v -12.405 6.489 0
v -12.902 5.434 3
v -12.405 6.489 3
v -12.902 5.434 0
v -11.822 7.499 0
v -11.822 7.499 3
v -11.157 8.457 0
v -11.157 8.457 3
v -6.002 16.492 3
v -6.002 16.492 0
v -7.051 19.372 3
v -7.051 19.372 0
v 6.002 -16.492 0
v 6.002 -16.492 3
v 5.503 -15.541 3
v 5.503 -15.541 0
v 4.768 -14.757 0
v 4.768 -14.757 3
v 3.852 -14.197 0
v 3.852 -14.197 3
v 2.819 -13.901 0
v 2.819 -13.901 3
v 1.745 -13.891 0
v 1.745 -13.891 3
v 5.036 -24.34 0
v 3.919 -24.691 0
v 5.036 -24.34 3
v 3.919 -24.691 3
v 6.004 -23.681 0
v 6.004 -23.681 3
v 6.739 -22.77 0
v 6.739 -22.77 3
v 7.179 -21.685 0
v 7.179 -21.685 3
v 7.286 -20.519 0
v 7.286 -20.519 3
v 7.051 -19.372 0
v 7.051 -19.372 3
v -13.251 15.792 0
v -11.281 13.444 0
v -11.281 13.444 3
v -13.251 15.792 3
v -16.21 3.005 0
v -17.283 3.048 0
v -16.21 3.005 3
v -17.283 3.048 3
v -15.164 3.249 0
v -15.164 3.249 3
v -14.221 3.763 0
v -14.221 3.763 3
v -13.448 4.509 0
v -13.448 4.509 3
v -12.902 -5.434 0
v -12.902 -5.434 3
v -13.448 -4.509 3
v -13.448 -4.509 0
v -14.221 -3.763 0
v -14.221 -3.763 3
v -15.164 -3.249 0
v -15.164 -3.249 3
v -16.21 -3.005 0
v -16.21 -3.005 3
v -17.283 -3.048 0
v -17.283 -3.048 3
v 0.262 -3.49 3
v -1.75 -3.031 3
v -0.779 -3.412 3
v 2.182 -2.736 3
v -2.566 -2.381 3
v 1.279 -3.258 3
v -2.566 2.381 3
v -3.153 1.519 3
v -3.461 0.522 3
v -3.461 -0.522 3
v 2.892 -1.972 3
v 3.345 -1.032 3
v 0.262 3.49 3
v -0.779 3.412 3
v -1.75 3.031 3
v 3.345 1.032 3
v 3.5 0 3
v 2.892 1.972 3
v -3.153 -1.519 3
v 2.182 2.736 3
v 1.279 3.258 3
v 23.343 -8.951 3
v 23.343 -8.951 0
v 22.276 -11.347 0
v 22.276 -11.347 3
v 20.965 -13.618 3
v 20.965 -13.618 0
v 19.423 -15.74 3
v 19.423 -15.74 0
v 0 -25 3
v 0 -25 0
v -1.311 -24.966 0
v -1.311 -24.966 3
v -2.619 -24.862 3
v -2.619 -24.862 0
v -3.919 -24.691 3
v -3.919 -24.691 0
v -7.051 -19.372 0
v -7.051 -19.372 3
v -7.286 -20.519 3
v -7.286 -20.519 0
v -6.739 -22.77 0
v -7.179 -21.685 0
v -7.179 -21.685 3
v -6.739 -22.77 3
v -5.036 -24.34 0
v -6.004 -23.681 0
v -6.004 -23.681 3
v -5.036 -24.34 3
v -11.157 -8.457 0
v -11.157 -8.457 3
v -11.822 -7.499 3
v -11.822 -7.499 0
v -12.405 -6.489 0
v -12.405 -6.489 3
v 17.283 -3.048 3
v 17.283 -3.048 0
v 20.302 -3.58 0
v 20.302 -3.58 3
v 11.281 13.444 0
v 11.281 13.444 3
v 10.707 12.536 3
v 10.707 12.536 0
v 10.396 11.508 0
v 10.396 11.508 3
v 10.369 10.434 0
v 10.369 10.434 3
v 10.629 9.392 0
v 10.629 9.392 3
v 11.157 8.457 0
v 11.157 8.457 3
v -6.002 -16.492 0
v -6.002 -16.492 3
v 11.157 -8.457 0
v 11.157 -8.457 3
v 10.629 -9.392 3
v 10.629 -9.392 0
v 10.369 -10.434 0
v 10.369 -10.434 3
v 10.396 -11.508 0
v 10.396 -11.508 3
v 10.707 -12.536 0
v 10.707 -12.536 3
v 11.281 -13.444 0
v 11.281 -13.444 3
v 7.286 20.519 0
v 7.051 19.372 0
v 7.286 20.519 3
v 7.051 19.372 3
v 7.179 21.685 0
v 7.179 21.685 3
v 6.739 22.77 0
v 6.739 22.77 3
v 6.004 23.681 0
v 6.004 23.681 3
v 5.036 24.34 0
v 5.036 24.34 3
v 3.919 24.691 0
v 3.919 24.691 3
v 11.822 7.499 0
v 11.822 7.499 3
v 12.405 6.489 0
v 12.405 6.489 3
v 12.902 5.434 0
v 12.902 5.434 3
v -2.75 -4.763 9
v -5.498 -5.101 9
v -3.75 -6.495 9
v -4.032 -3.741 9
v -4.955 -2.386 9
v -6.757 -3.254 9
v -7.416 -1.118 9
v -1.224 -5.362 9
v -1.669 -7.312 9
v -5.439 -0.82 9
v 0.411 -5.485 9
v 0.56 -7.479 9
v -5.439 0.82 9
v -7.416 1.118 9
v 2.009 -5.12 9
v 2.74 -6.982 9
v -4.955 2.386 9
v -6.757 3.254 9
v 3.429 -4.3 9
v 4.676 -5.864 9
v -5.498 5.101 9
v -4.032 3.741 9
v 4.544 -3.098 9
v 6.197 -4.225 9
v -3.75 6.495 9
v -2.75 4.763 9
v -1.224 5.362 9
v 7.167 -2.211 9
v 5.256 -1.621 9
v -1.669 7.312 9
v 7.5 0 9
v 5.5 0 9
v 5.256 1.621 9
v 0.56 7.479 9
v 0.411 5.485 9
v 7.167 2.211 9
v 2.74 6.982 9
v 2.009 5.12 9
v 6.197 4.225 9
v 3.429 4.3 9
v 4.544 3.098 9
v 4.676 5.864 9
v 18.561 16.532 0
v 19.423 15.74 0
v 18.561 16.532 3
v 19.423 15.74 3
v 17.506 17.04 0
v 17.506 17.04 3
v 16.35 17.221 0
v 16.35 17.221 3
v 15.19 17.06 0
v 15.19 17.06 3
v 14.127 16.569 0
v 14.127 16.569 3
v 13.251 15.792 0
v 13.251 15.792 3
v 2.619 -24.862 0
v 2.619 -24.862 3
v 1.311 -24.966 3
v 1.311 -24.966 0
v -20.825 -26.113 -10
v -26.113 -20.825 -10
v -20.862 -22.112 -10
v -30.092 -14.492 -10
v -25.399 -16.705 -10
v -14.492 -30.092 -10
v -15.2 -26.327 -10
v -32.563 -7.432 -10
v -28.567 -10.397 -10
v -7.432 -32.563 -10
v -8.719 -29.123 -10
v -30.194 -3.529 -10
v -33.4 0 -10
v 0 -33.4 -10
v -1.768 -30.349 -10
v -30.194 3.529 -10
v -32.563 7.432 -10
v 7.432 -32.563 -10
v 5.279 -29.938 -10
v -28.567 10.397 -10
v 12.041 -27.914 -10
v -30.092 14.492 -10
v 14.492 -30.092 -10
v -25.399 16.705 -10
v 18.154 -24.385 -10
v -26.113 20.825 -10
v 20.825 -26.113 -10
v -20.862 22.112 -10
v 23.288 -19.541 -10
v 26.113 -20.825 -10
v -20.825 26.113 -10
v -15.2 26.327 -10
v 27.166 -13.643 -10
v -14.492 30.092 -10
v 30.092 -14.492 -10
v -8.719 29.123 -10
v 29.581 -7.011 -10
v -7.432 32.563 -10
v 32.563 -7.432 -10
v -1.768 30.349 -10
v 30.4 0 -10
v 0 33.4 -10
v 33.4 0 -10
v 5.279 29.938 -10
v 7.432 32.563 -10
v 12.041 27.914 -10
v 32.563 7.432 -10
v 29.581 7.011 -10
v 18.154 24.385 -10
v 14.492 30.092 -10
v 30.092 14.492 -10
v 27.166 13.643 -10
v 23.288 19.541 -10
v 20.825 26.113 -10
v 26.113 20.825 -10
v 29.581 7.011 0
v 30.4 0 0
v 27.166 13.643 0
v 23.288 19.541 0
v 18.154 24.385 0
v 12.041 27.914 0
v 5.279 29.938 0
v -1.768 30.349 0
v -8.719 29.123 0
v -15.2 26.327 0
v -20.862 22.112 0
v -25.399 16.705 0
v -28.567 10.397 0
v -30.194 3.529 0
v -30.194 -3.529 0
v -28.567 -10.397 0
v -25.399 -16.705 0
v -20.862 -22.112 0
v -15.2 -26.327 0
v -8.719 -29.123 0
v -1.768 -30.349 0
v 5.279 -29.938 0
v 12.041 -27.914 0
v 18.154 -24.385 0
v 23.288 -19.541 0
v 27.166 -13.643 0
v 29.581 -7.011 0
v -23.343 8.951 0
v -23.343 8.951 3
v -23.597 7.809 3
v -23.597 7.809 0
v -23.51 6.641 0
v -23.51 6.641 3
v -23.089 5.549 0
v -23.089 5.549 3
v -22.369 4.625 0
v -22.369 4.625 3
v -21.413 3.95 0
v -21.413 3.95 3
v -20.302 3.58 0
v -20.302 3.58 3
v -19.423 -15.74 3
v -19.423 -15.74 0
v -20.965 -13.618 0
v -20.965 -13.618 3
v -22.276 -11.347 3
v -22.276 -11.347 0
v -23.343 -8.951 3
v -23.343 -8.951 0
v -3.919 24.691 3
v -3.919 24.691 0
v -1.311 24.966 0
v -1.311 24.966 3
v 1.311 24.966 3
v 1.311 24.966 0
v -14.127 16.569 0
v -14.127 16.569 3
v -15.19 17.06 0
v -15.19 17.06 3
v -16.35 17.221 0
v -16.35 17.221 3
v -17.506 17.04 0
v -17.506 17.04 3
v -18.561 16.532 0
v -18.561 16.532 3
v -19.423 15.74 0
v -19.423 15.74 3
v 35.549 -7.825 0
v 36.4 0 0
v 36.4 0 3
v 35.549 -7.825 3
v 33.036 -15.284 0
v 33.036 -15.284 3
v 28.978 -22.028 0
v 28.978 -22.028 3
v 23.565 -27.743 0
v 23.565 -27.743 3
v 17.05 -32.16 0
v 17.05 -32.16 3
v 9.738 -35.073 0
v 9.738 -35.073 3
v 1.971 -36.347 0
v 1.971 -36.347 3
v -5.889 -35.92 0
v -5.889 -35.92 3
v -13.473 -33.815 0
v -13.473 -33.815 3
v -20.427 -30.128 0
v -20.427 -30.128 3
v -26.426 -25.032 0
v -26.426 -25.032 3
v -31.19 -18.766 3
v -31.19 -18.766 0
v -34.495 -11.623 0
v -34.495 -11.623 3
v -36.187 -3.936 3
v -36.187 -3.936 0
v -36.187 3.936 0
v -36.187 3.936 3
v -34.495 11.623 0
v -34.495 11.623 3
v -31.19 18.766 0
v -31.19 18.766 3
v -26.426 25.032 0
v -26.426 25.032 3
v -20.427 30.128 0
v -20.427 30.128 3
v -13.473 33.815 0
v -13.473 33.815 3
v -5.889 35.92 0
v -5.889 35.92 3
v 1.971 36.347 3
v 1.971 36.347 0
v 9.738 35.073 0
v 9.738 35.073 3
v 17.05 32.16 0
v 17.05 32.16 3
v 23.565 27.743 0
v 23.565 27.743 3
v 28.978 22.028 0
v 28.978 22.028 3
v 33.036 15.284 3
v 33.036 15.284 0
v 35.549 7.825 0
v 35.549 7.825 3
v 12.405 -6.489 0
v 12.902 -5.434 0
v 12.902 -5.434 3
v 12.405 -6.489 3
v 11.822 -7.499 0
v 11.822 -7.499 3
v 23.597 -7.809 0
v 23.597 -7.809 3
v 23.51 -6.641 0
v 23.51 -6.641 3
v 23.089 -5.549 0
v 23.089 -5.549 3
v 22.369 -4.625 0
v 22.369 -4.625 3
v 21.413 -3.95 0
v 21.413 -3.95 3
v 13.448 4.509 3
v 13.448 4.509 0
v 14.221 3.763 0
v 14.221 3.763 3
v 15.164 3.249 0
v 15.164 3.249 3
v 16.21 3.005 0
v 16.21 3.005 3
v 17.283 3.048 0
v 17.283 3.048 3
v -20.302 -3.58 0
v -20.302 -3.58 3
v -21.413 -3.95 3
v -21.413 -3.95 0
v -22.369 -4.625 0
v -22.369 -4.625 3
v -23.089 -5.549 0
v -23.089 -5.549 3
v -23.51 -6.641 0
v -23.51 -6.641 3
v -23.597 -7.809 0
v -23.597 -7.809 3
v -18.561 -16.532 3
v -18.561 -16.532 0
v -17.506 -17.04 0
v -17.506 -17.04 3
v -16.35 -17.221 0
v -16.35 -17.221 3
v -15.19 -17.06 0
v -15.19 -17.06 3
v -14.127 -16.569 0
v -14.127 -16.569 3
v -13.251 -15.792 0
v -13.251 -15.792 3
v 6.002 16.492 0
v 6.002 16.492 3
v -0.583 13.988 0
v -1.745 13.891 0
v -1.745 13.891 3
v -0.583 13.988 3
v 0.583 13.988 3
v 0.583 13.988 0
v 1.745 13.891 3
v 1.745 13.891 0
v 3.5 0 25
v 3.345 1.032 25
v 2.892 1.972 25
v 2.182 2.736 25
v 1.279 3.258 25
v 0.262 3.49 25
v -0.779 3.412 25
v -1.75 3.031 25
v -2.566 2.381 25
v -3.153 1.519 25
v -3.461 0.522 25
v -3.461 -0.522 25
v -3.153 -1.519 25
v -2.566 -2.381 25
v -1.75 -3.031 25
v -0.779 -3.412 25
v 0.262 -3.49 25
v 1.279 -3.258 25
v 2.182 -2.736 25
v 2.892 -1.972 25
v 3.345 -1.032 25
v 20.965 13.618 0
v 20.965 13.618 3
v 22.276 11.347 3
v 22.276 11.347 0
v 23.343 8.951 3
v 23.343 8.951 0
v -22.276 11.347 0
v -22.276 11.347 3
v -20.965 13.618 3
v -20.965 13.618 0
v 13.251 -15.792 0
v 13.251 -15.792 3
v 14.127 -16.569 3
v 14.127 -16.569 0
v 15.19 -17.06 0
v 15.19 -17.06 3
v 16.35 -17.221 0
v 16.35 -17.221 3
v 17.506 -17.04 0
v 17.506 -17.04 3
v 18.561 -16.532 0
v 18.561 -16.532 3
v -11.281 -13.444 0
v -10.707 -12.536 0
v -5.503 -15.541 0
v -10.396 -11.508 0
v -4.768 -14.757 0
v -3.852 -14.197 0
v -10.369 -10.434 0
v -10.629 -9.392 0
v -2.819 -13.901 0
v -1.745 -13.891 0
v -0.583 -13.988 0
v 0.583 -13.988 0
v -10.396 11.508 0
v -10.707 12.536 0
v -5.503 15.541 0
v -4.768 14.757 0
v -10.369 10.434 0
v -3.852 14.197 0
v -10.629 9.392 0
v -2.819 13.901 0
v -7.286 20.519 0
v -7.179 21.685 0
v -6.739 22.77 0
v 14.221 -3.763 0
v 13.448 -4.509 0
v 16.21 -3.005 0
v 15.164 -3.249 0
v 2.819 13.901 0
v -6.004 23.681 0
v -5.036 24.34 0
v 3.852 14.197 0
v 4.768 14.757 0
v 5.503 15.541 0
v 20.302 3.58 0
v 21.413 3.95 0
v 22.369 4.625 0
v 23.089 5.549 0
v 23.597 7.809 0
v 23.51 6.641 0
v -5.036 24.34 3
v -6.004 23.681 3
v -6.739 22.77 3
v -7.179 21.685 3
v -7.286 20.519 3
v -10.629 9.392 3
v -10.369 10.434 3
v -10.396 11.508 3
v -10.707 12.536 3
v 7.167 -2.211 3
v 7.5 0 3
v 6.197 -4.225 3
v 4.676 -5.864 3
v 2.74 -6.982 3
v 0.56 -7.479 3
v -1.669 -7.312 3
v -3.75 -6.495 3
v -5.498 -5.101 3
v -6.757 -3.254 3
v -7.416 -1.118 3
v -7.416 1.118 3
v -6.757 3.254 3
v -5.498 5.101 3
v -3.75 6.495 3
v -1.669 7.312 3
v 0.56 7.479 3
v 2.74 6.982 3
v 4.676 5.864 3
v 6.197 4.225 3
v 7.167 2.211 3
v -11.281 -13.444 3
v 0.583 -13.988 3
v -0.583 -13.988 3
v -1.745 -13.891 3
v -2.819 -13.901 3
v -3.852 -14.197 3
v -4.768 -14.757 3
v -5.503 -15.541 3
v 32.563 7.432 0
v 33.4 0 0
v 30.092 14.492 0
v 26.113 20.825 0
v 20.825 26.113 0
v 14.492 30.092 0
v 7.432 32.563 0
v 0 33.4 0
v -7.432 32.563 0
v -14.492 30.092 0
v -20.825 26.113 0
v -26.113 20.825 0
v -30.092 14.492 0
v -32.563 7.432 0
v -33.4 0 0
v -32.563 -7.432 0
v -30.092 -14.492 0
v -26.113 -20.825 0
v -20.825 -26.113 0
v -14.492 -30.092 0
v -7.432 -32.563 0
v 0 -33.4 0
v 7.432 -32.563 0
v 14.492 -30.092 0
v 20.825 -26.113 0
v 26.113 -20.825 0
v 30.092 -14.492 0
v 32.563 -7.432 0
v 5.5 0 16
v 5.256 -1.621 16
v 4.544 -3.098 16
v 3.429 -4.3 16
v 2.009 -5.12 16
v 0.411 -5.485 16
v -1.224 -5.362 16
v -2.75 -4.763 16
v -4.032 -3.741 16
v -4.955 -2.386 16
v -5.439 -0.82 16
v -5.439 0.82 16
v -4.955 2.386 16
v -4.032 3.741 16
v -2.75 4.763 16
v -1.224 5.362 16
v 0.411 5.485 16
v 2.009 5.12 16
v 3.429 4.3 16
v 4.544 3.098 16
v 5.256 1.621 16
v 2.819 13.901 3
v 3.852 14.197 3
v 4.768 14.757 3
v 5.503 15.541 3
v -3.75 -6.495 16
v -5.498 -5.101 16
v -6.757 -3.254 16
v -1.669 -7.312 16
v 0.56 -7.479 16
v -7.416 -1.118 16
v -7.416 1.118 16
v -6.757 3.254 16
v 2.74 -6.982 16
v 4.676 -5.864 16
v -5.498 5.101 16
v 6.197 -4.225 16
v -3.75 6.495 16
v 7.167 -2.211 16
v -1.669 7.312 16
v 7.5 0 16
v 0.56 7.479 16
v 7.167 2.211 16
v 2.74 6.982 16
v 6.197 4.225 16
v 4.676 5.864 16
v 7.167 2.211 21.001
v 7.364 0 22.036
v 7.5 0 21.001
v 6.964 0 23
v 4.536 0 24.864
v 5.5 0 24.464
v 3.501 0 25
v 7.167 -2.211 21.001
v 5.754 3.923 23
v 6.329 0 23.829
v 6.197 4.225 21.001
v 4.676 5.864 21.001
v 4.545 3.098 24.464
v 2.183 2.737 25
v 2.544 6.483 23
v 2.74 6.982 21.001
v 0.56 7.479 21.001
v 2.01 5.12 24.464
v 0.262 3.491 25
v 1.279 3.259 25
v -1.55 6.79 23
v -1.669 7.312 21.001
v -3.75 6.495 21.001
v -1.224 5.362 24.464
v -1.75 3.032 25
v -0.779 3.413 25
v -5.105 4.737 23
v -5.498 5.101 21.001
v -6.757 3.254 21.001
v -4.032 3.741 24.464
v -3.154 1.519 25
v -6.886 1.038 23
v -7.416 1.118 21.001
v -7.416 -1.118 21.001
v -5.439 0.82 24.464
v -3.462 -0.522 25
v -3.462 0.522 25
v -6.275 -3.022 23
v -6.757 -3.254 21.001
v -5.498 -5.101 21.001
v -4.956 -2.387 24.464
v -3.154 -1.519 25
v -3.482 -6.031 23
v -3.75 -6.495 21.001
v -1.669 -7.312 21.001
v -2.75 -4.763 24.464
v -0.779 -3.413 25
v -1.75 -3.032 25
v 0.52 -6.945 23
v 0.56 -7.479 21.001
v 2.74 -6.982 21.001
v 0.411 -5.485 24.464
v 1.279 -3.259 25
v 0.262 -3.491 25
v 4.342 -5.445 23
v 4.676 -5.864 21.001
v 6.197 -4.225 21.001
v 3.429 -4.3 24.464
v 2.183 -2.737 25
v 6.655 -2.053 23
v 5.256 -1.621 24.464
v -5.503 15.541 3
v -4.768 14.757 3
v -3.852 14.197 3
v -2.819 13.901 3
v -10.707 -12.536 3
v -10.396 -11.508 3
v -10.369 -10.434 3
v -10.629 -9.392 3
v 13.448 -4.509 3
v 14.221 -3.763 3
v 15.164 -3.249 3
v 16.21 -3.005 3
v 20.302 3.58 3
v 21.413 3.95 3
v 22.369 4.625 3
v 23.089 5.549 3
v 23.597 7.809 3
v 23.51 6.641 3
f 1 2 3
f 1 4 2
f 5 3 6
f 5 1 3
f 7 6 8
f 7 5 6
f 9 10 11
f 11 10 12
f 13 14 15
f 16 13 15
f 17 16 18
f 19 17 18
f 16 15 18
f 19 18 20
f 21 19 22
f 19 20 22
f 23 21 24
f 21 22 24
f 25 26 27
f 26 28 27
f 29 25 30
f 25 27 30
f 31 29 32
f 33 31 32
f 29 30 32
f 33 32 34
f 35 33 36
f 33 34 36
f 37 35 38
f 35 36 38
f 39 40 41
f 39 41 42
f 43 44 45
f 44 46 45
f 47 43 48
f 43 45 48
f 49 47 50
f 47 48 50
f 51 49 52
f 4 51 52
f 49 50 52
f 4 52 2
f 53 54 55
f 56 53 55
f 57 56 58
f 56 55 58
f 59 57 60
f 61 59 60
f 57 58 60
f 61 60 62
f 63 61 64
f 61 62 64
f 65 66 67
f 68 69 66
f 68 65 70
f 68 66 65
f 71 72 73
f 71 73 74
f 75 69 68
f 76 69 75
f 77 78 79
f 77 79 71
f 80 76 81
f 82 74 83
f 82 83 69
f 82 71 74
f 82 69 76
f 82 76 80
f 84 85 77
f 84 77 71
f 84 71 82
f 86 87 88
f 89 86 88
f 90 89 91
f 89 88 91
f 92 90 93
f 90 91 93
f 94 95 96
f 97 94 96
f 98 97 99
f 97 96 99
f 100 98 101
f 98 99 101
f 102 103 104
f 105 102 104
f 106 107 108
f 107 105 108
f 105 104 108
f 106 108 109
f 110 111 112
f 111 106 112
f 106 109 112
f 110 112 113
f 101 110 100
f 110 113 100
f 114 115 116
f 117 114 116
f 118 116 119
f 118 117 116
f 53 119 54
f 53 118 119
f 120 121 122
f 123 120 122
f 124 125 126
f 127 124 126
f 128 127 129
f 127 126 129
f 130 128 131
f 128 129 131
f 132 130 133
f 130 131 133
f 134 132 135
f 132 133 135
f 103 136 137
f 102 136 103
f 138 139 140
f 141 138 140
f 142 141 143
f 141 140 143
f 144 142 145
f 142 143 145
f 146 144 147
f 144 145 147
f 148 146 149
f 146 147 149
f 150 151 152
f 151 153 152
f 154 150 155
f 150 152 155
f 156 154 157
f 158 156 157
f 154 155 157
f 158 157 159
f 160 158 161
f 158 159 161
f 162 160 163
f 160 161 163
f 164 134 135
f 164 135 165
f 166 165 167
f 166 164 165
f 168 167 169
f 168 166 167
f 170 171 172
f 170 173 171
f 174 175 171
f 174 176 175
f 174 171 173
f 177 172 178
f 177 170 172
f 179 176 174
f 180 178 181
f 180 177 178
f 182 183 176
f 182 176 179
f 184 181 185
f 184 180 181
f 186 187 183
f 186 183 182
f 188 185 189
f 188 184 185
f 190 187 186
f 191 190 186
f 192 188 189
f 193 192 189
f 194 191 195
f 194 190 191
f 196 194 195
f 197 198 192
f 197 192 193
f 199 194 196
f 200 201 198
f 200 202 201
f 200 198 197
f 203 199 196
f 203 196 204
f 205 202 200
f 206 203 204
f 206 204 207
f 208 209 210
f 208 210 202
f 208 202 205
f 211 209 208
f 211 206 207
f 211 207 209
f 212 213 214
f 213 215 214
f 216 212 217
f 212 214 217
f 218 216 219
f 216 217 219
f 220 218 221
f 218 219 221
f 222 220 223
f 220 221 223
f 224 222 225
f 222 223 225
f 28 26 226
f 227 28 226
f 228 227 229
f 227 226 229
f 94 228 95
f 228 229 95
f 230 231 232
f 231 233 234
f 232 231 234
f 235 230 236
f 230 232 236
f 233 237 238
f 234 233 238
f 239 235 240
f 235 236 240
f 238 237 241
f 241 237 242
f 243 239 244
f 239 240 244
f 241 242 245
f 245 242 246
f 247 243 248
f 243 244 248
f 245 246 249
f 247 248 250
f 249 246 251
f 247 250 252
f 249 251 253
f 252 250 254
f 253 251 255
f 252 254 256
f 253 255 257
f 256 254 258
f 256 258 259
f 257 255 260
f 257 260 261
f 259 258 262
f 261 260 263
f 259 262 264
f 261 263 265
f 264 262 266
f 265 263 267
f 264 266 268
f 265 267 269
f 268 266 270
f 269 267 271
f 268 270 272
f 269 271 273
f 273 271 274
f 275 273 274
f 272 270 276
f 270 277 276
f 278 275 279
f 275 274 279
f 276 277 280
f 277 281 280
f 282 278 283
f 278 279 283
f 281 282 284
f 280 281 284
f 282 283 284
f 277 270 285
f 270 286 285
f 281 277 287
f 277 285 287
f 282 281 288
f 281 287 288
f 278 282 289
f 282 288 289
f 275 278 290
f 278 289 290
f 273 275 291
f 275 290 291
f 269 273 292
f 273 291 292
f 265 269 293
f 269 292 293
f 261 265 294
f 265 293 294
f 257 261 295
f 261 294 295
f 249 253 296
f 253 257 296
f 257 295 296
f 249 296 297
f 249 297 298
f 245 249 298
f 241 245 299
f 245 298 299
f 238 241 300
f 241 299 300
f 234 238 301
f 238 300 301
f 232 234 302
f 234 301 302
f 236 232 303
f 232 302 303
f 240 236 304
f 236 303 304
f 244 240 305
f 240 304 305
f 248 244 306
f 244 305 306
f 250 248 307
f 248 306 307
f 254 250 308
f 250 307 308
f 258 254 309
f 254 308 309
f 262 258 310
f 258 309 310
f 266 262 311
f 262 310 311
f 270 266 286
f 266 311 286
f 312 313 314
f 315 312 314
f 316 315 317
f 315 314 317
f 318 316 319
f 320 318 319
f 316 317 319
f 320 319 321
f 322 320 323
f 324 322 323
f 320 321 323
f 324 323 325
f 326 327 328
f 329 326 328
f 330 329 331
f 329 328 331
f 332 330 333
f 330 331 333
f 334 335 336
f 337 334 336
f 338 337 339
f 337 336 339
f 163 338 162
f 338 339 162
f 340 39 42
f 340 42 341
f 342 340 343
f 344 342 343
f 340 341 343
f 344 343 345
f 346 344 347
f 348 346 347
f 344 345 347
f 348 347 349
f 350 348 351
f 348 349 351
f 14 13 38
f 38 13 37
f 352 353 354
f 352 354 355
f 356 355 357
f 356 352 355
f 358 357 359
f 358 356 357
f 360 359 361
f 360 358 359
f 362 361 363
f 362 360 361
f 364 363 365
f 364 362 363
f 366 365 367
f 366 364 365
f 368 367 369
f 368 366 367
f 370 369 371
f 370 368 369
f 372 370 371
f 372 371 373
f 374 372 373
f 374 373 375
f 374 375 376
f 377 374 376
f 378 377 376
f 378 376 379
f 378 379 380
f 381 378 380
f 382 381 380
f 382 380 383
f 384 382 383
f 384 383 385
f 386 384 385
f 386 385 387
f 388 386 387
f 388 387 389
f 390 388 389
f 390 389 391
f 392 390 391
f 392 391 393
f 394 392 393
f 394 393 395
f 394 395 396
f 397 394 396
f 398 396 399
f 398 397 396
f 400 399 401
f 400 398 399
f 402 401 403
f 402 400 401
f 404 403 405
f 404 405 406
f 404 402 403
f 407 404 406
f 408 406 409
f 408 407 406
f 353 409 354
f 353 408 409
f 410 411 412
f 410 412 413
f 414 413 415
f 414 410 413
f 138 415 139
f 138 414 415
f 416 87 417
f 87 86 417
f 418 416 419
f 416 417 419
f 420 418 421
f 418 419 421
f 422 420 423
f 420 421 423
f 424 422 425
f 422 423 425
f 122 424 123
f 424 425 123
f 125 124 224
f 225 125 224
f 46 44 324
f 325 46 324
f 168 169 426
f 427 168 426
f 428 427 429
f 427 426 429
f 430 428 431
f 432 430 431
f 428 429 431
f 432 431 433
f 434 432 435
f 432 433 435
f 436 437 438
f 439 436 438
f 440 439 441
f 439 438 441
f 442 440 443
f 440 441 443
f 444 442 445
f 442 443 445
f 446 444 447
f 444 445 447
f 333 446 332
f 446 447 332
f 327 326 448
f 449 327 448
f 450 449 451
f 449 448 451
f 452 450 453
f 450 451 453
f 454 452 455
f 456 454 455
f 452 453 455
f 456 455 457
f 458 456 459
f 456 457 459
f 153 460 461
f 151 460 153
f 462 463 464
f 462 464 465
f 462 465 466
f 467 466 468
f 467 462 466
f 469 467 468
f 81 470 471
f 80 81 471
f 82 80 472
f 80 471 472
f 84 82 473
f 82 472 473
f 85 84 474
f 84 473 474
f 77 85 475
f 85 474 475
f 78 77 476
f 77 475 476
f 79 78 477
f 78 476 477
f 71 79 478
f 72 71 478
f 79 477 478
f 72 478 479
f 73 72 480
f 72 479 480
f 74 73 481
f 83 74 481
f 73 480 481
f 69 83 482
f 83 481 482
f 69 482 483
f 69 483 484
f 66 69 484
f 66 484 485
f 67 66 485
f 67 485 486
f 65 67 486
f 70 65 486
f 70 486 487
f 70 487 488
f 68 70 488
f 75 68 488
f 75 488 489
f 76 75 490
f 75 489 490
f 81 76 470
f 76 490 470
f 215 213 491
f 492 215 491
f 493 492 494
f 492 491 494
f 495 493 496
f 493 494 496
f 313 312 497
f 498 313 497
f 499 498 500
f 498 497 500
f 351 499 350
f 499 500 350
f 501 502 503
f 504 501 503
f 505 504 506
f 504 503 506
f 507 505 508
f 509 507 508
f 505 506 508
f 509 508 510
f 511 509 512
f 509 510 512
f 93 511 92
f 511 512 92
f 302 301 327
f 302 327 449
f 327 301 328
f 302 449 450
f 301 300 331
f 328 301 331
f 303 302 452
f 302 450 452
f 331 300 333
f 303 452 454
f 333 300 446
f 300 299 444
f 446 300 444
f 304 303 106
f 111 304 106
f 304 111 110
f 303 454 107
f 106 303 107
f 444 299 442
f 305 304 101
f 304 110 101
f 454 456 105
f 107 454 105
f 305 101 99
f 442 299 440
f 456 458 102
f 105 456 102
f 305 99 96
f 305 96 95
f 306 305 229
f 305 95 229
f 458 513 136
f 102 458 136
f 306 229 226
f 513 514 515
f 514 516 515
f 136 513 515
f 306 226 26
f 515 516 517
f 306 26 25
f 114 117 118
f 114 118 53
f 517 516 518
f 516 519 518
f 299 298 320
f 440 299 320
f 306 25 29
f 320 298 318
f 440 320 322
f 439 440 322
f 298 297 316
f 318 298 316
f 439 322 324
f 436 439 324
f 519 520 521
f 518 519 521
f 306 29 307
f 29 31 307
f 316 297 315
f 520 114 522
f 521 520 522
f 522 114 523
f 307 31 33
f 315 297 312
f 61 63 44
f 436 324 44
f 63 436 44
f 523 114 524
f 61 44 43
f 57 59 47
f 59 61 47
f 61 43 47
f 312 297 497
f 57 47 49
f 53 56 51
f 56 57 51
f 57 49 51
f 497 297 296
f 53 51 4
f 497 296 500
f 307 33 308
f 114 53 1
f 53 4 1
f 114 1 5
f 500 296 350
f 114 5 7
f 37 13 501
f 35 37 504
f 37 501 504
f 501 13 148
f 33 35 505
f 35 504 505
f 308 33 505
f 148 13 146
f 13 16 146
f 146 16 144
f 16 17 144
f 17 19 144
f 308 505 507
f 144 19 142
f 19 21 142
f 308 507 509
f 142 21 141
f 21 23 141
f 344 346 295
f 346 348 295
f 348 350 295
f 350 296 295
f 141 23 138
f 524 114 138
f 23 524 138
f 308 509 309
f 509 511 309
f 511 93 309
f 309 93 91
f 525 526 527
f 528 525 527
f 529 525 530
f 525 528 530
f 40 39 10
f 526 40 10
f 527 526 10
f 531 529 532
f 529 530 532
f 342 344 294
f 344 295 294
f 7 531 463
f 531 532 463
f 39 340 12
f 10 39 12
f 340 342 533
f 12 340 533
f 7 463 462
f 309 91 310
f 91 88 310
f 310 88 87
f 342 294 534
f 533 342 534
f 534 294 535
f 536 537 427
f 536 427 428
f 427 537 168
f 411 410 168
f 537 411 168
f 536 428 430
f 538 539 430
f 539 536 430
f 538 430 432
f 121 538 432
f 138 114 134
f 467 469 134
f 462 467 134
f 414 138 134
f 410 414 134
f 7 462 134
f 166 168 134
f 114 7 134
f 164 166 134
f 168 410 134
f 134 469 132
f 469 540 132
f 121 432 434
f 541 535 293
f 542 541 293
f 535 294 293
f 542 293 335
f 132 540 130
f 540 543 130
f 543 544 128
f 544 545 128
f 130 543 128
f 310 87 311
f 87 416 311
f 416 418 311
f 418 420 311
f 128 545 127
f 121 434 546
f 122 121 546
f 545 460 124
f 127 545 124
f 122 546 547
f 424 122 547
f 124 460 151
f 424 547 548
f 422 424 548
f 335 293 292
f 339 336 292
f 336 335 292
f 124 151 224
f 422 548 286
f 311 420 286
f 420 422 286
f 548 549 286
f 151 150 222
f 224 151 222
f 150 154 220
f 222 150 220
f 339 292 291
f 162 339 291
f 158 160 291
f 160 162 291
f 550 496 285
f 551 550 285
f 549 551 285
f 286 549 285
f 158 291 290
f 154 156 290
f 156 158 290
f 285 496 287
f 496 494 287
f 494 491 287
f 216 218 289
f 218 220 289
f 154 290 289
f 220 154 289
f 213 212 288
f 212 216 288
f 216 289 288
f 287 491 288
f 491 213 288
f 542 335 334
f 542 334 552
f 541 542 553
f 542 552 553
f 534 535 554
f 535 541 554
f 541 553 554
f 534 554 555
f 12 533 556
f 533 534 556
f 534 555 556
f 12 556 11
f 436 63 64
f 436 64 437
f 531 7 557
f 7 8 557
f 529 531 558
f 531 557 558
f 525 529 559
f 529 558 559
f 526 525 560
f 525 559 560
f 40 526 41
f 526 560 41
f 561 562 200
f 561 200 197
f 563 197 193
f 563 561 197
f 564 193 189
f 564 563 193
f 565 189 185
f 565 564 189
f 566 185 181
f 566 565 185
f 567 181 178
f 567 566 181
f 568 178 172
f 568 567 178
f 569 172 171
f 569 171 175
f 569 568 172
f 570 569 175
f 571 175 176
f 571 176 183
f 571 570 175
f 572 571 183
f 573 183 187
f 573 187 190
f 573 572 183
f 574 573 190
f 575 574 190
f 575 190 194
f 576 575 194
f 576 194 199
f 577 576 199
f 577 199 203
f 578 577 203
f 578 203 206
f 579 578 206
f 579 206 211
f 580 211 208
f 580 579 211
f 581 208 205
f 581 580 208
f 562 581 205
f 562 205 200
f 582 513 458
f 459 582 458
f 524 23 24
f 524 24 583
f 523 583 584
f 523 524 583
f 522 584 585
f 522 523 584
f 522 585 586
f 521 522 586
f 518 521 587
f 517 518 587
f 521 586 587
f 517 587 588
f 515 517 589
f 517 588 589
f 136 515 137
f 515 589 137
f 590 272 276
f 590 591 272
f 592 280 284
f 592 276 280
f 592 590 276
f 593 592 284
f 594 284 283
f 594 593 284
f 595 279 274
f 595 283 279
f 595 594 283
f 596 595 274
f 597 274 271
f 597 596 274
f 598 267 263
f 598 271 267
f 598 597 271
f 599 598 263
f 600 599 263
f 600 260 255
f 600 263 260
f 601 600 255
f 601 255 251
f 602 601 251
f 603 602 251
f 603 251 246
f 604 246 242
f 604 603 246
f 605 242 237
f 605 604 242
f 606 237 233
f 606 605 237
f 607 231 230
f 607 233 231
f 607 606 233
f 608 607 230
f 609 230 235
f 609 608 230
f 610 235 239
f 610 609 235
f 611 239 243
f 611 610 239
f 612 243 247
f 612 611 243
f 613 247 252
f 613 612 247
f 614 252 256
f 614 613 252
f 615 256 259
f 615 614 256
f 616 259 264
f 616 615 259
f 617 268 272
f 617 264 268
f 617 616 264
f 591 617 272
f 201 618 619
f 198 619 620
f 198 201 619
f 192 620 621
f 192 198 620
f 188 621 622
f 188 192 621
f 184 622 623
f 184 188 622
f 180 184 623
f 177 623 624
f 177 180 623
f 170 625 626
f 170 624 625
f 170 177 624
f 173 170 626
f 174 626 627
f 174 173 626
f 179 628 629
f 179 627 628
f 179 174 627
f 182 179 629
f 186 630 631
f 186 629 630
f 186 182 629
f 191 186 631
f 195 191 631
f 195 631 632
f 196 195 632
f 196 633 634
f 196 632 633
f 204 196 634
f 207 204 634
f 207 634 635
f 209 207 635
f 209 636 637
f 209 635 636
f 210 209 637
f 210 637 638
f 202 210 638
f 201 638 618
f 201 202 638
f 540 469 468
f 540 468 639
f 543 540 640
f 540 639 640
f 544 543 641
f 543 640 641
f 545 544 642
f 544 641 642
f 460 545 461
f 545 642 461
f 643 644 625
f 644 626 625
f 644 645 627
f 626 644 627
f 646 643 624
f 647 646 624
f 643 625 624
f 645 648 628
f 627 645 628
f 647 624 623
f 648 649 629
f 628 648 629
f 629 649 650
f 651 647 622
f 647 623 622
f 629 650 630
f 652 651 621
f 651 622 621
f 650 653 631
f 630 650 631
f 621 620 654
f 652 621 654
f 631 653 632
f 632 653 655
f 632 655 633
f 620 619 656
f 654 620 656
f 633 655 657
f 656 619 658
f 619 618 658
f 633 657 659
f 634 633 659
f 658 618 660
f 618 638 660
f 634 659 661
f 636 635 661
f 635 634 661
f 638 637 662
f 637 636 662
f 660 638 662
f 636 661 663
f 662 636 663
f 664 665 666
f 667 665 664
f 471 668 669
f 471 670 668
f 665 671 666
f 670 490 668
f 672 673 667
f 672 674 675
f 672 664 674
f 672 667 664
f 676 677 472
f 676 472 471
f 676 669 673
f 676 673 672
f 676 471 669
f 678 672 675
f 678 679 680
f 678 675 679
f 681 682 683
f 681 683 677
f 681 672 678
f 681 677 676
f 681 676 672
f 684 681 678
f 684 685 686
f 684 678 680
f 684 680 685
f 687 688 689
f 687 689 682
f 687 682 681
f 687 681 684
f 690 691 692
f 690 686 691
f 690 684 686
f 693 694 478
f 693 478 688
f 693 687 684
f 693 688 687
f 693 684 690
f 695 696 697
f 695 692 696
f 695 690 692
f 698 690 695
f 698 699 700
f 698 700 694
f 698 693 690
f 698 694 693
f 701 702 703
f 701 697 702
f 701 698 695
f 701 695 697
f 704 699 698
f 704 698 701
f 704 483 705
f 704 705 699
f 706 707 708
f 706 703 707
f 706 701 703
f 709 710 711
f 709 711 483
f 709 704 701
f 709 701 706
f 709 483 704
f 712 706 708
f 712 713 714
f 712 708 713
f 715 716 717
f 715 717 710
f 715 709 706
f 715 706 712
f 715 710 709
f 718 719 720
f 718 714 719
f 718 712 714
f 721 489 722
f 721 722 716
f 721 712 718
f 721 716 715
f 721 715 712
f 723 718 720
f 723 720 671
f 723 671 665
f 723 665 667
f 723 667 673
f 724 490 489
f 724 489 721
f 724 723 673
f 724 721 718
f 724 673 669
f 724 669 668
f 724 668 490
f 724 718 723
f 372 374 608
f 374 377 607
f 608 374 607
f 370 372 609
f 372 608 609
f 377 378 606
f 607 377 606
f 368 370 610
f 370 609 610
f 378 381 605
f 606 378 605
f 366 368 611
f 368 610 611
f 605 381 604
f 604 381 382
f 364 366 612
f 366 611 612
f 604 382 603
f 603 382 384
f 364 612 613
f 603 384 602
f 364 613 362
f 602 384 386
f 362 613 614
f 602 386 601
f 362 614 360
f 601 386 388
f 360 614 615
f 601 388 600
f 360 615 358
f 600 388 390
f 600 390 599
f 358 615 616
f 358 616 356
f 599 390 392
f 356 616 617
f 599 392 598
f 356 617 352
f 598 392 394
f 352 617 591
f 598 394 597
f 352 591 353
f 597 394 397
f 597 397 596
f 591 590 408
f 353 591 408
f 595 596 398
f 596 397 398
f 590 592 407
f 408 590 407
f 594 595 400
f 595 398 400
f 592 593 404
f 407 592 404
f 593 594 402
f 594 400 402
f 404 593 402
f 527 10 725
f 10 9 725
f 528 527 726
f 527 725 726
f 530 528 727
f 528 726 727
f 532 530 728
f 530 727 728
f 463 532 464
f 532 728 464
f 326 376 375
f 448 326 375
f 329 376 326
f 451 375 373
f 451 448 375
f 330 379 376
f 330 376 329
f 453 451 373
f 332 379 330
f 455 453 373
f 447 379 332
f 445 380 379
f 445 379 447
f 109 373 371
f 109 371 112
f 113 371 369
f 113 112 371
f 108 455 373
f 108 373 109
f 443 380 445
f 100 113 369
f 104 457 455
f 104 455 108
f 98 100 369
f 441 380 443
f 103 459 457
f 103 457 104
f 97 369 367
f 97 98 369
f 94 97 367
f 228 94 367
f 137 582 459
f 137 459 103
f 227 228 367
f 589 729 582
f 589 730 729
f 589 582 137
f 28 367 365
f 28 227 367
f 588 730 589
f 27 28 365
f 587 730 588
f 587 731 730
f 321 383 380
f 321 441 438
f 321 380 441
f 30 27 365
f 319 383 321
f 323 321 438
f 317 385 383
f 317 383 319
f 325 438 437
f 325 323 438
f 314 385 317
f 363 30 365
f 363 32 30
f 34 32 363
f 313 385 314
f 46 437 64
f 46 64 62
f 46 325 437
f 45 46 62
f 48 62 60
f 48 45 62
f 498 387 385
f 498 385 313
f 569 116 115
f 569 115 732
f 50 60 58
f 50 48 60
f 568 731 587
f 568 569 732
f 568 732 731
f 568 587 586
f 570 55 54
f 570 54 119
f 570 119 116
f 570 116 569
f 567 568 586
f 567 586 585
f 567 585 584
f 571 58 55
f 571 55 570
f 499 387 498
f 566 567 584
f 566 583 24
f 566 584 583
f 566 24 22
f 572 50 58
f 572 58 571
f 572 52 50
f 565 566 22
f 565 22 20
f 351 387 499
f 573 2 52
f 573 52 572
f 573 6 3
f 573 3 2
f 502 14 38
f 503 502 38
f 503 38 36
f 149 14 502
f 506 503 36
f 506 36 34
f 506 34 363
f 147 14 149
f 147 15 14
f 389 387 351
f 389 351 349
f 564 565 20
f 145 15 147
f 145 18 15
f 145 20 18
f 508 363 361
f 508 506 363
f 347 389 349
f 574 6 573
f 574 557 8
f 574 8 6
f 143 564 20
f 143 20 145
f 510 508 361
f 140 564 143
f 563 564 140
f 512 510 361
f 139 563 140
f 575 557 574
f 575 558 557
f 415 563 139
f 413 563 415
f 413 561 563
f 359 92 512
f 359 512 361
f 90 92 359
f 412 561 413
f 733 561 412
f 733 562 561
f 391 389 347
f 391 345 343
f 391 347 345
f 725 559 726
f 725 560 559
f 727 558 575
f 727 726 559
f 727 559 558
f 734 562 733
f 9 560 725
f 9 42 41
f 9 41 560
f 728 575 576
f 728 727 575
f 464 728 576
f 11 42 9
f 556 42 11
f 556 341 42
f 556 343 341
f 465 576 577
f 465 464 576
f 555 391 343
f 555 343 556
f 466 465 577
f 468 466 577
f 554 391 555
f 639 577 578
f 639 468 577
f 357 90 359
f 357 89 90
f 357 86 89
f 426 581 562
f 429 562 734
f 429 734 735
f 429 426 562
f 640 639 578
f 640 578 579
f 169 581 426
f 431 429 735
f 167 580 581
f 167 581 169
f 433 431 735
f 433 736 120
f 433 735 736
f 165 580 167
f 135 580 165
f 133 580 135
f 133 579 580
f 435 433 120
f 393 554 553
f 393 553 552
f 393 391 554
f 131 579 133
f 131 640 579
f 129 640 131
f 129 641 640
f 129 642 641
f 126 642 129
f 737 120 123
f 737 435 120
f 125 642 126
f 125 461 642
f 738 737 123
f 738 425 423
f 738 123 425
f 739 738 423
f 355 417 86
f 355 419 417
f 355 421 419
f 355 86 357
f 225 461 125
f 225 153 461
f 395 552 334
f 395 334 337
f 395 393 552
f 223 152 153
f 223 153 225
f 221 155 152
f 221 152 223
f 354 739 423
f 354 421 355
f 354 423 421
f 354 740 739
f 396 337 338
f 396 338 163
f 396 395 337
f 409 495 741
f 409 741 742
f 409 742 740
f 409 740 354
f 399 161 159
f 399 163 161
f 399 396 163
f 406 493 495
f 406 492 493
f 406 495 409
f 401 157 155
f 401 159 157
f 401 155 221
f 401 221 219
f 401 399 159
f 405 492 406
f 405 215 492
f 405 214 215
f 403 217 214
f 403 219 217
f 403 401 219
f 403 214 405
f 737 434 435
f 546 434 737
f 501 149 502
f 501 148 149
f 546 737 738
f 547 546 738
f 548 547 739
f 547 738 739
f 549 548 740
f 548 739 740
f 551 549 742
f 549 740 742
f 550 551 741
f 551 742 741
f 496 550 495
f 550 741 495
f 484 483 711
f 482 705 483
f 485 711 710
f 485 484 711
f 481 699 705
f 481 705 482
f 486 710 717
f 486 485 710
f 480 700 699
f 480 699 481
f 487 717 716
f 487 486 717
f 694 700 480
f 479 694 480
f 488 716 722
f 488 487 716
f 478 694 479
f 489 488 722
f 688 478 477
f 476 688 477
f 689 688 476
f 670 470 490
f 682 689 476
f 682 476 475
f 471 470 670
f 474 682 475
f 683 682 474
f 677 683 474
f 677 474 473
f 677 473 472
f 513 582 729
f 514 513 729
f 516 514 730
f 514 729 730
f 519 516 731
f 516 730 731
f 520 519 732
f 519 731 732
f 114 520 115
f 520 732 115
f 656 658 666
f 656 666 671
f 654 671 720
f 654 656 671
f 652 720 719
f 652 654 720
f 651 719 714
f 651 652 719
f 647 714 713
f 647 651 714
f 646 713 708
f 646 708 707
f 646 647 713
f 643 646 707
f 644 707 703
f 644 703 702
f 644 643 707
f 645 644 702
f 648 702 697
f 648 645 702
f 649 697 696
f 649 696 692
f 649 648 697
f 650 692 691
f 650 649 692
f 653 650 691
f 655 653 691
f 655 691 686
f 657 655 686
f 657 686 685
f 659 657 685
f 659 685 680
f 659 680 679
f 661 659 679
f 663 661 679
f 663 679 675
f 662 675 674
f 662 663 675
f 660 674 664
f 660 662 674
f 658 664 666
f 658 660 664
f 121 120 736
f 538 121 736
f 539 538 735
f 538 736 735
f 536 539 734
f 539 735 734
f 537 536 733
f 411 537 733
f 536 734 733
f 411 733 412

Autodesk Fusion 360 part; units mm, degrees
sketch "Sketch1" plane through (0, 0, 0) normal (0, 0, 1) x (1, 0, 0)
  circle A0 centre (0, 0) radius 30.4
  circle A1 centre (0, 0) radius 33.4
  circle A2 centre (0, 0) radius 36.4
  circle A3 centre (0, 0) radius 7.5
  circle A4 centre (0, 0) radius 14
  line L0 (0, 0) -> (4.7883, -13.1557)
  line L1 (0, 0) -> (-4.7883, -13.1557)
  line L2 (0, -60) -> (0, 60)
  line L3 (4.7883, -13.1557) -> (8.5505, -23.4923)
  line L4 (-4.7883, -13.1557) -> (-8.5505, -23.4923)
  arc A5 (8.5505, -23.4923) -> (-8.5505, -23.4923) centre (0, 0) ccw
  arc A6 (-8.5505, -23.4923) -> (0, -25) centre (0, 0) ccw
  arc A7 (0, -25) -> (8.5505, -23.4923) centre (0, 0) ccw
  line L5 (13.7873, -2.4311) -> (24.6202, -4.3412)
  line L6 (8.999, -10.7246) -> (16.0697, -19.1511)
  line L7 (8.999, 10.7246) -> (16.0697, 19.1511)
  line L8 (13.7873, 2.4311) -> (24.6202, 4.3412)
  line L9 (-4.7883, 13.1557) -> (-8.5505, 23.4923)
  line L10 (4.7883, 13.1557) -> (8.5505, 23.4923)
  line L11 (-13.7873, 2.4311) -> (-24.6202, 4.3412)
  line L12 (-8.999, 10.7246) -> (-16.0697, 19.1511)
  line L13 (-8.999, -10.7246) -> (-16.0697, -19.1511)
  line L14 (-13.7873, -2.4311) -> (-24.6202, -4.3412)
  circle A8 centre (0, 0) radius 3.5
  circle A9 centre (0, 0) radius 5.5
  point P0 (0, 7.5)
  dimension "d1" = 60.8
  dimension "d2" = 3
  dimension "d3" = 3
  dimension "d4" = 15
  dimension "d11" = 28
  dimension "d12" = 50
  dimension "d13" = 40
  dimension "d15" = 20
  dimension "d17" = 360
  dimension "d22" = -4
  dimension "d34" = -2
extrude "Extrude1" add sketch "Sketch1" against normal blind 10 contours A0 A1 L2 | A0 A1 L2
extrude "Extrude2" add sketch "Sketch1" along normal blind 3
extrude "Extrude3" add sketch "Sketch1" along normal blind 25 contours A3 L1 L2 A9 | A3 L0 L2 A9 | A3 L0 L2 A9 | A3 L1 L2 A9 | L0 L2 A8 A9 | L1 L2 A8 A9 | L1 L2 A8 A9 | L0 L2 A8 A9 | L0 L2 A8 | L1 L2 A8 | L1 L2 A8 | L0 L2 A8
extrude "Extrude4" cut sketch "Sketch1" along normal blind 3 contours A4 L2 A5 L10 | A4 L2 A5 L9 | A4 L2 L4 A6 | A4 L2 L3 A7 | A4 A5 L7 L8 | A4 A5 L11 L12 | A4 A5 L13 L14 | A4 A5 L5 L6
fillet "Fillet1" radius 4 24 edges at (-16.0697, 19.1511, 1.5) (-24.6202, 4.3412, 1.5) (-13.7873, 2.4311, 1.5) (-8.999, 10.7246, 1.5) (-13.7873, -2.4311, 1.5) (-24.6202, -4.3412, 1.5) (-16.0697, -19.1511, 1.5) (-8.999, -10.7246, 1.5) (-4.7883, -13.1557, 1.5) (-8.5505, -23.4923, 1.5) (8.5505, -23.4923, 1.5) (4.7883, -13.1557, 1.5) (8.999, -10.7246, 1.5) (16.0697, -19.1511, 1.5) (24.6202, -4.3412, 1.5) (13.7873, -2.4311, 1.5) (24.6202, 4.3412, 1.5) (16.0697, 19.1511, 1.5) (13.7873, 2.4311, 1.5) (8.999, 10.7246, 1.5) (4.7883, 13.1557, 1.5) (8.5505, 23.4923, 1.5) (-4.7883, 13.1557, 1.5) (-8.5505, 23.4923, 1.5)
extrude "Extrude5" cut sketch "Sketch1" against normal up to surface (22 mm away) from surface at 25 contours L0 L2 A8 | L1 L2 A8 | L1 L2 A8 | L0 L2 A8
extrude "Extrude7" cut sketch "Sketch1" along normal blind 7 from surface at 9 contours A3 L1 L2 A9 | A3 L0 L2 A9 | A3 L0 L2 A9 | A3 L1 L2 A9
fillet "Fillet4" radius 4 1 edges at (-6.9925, -2.7121, 25)
